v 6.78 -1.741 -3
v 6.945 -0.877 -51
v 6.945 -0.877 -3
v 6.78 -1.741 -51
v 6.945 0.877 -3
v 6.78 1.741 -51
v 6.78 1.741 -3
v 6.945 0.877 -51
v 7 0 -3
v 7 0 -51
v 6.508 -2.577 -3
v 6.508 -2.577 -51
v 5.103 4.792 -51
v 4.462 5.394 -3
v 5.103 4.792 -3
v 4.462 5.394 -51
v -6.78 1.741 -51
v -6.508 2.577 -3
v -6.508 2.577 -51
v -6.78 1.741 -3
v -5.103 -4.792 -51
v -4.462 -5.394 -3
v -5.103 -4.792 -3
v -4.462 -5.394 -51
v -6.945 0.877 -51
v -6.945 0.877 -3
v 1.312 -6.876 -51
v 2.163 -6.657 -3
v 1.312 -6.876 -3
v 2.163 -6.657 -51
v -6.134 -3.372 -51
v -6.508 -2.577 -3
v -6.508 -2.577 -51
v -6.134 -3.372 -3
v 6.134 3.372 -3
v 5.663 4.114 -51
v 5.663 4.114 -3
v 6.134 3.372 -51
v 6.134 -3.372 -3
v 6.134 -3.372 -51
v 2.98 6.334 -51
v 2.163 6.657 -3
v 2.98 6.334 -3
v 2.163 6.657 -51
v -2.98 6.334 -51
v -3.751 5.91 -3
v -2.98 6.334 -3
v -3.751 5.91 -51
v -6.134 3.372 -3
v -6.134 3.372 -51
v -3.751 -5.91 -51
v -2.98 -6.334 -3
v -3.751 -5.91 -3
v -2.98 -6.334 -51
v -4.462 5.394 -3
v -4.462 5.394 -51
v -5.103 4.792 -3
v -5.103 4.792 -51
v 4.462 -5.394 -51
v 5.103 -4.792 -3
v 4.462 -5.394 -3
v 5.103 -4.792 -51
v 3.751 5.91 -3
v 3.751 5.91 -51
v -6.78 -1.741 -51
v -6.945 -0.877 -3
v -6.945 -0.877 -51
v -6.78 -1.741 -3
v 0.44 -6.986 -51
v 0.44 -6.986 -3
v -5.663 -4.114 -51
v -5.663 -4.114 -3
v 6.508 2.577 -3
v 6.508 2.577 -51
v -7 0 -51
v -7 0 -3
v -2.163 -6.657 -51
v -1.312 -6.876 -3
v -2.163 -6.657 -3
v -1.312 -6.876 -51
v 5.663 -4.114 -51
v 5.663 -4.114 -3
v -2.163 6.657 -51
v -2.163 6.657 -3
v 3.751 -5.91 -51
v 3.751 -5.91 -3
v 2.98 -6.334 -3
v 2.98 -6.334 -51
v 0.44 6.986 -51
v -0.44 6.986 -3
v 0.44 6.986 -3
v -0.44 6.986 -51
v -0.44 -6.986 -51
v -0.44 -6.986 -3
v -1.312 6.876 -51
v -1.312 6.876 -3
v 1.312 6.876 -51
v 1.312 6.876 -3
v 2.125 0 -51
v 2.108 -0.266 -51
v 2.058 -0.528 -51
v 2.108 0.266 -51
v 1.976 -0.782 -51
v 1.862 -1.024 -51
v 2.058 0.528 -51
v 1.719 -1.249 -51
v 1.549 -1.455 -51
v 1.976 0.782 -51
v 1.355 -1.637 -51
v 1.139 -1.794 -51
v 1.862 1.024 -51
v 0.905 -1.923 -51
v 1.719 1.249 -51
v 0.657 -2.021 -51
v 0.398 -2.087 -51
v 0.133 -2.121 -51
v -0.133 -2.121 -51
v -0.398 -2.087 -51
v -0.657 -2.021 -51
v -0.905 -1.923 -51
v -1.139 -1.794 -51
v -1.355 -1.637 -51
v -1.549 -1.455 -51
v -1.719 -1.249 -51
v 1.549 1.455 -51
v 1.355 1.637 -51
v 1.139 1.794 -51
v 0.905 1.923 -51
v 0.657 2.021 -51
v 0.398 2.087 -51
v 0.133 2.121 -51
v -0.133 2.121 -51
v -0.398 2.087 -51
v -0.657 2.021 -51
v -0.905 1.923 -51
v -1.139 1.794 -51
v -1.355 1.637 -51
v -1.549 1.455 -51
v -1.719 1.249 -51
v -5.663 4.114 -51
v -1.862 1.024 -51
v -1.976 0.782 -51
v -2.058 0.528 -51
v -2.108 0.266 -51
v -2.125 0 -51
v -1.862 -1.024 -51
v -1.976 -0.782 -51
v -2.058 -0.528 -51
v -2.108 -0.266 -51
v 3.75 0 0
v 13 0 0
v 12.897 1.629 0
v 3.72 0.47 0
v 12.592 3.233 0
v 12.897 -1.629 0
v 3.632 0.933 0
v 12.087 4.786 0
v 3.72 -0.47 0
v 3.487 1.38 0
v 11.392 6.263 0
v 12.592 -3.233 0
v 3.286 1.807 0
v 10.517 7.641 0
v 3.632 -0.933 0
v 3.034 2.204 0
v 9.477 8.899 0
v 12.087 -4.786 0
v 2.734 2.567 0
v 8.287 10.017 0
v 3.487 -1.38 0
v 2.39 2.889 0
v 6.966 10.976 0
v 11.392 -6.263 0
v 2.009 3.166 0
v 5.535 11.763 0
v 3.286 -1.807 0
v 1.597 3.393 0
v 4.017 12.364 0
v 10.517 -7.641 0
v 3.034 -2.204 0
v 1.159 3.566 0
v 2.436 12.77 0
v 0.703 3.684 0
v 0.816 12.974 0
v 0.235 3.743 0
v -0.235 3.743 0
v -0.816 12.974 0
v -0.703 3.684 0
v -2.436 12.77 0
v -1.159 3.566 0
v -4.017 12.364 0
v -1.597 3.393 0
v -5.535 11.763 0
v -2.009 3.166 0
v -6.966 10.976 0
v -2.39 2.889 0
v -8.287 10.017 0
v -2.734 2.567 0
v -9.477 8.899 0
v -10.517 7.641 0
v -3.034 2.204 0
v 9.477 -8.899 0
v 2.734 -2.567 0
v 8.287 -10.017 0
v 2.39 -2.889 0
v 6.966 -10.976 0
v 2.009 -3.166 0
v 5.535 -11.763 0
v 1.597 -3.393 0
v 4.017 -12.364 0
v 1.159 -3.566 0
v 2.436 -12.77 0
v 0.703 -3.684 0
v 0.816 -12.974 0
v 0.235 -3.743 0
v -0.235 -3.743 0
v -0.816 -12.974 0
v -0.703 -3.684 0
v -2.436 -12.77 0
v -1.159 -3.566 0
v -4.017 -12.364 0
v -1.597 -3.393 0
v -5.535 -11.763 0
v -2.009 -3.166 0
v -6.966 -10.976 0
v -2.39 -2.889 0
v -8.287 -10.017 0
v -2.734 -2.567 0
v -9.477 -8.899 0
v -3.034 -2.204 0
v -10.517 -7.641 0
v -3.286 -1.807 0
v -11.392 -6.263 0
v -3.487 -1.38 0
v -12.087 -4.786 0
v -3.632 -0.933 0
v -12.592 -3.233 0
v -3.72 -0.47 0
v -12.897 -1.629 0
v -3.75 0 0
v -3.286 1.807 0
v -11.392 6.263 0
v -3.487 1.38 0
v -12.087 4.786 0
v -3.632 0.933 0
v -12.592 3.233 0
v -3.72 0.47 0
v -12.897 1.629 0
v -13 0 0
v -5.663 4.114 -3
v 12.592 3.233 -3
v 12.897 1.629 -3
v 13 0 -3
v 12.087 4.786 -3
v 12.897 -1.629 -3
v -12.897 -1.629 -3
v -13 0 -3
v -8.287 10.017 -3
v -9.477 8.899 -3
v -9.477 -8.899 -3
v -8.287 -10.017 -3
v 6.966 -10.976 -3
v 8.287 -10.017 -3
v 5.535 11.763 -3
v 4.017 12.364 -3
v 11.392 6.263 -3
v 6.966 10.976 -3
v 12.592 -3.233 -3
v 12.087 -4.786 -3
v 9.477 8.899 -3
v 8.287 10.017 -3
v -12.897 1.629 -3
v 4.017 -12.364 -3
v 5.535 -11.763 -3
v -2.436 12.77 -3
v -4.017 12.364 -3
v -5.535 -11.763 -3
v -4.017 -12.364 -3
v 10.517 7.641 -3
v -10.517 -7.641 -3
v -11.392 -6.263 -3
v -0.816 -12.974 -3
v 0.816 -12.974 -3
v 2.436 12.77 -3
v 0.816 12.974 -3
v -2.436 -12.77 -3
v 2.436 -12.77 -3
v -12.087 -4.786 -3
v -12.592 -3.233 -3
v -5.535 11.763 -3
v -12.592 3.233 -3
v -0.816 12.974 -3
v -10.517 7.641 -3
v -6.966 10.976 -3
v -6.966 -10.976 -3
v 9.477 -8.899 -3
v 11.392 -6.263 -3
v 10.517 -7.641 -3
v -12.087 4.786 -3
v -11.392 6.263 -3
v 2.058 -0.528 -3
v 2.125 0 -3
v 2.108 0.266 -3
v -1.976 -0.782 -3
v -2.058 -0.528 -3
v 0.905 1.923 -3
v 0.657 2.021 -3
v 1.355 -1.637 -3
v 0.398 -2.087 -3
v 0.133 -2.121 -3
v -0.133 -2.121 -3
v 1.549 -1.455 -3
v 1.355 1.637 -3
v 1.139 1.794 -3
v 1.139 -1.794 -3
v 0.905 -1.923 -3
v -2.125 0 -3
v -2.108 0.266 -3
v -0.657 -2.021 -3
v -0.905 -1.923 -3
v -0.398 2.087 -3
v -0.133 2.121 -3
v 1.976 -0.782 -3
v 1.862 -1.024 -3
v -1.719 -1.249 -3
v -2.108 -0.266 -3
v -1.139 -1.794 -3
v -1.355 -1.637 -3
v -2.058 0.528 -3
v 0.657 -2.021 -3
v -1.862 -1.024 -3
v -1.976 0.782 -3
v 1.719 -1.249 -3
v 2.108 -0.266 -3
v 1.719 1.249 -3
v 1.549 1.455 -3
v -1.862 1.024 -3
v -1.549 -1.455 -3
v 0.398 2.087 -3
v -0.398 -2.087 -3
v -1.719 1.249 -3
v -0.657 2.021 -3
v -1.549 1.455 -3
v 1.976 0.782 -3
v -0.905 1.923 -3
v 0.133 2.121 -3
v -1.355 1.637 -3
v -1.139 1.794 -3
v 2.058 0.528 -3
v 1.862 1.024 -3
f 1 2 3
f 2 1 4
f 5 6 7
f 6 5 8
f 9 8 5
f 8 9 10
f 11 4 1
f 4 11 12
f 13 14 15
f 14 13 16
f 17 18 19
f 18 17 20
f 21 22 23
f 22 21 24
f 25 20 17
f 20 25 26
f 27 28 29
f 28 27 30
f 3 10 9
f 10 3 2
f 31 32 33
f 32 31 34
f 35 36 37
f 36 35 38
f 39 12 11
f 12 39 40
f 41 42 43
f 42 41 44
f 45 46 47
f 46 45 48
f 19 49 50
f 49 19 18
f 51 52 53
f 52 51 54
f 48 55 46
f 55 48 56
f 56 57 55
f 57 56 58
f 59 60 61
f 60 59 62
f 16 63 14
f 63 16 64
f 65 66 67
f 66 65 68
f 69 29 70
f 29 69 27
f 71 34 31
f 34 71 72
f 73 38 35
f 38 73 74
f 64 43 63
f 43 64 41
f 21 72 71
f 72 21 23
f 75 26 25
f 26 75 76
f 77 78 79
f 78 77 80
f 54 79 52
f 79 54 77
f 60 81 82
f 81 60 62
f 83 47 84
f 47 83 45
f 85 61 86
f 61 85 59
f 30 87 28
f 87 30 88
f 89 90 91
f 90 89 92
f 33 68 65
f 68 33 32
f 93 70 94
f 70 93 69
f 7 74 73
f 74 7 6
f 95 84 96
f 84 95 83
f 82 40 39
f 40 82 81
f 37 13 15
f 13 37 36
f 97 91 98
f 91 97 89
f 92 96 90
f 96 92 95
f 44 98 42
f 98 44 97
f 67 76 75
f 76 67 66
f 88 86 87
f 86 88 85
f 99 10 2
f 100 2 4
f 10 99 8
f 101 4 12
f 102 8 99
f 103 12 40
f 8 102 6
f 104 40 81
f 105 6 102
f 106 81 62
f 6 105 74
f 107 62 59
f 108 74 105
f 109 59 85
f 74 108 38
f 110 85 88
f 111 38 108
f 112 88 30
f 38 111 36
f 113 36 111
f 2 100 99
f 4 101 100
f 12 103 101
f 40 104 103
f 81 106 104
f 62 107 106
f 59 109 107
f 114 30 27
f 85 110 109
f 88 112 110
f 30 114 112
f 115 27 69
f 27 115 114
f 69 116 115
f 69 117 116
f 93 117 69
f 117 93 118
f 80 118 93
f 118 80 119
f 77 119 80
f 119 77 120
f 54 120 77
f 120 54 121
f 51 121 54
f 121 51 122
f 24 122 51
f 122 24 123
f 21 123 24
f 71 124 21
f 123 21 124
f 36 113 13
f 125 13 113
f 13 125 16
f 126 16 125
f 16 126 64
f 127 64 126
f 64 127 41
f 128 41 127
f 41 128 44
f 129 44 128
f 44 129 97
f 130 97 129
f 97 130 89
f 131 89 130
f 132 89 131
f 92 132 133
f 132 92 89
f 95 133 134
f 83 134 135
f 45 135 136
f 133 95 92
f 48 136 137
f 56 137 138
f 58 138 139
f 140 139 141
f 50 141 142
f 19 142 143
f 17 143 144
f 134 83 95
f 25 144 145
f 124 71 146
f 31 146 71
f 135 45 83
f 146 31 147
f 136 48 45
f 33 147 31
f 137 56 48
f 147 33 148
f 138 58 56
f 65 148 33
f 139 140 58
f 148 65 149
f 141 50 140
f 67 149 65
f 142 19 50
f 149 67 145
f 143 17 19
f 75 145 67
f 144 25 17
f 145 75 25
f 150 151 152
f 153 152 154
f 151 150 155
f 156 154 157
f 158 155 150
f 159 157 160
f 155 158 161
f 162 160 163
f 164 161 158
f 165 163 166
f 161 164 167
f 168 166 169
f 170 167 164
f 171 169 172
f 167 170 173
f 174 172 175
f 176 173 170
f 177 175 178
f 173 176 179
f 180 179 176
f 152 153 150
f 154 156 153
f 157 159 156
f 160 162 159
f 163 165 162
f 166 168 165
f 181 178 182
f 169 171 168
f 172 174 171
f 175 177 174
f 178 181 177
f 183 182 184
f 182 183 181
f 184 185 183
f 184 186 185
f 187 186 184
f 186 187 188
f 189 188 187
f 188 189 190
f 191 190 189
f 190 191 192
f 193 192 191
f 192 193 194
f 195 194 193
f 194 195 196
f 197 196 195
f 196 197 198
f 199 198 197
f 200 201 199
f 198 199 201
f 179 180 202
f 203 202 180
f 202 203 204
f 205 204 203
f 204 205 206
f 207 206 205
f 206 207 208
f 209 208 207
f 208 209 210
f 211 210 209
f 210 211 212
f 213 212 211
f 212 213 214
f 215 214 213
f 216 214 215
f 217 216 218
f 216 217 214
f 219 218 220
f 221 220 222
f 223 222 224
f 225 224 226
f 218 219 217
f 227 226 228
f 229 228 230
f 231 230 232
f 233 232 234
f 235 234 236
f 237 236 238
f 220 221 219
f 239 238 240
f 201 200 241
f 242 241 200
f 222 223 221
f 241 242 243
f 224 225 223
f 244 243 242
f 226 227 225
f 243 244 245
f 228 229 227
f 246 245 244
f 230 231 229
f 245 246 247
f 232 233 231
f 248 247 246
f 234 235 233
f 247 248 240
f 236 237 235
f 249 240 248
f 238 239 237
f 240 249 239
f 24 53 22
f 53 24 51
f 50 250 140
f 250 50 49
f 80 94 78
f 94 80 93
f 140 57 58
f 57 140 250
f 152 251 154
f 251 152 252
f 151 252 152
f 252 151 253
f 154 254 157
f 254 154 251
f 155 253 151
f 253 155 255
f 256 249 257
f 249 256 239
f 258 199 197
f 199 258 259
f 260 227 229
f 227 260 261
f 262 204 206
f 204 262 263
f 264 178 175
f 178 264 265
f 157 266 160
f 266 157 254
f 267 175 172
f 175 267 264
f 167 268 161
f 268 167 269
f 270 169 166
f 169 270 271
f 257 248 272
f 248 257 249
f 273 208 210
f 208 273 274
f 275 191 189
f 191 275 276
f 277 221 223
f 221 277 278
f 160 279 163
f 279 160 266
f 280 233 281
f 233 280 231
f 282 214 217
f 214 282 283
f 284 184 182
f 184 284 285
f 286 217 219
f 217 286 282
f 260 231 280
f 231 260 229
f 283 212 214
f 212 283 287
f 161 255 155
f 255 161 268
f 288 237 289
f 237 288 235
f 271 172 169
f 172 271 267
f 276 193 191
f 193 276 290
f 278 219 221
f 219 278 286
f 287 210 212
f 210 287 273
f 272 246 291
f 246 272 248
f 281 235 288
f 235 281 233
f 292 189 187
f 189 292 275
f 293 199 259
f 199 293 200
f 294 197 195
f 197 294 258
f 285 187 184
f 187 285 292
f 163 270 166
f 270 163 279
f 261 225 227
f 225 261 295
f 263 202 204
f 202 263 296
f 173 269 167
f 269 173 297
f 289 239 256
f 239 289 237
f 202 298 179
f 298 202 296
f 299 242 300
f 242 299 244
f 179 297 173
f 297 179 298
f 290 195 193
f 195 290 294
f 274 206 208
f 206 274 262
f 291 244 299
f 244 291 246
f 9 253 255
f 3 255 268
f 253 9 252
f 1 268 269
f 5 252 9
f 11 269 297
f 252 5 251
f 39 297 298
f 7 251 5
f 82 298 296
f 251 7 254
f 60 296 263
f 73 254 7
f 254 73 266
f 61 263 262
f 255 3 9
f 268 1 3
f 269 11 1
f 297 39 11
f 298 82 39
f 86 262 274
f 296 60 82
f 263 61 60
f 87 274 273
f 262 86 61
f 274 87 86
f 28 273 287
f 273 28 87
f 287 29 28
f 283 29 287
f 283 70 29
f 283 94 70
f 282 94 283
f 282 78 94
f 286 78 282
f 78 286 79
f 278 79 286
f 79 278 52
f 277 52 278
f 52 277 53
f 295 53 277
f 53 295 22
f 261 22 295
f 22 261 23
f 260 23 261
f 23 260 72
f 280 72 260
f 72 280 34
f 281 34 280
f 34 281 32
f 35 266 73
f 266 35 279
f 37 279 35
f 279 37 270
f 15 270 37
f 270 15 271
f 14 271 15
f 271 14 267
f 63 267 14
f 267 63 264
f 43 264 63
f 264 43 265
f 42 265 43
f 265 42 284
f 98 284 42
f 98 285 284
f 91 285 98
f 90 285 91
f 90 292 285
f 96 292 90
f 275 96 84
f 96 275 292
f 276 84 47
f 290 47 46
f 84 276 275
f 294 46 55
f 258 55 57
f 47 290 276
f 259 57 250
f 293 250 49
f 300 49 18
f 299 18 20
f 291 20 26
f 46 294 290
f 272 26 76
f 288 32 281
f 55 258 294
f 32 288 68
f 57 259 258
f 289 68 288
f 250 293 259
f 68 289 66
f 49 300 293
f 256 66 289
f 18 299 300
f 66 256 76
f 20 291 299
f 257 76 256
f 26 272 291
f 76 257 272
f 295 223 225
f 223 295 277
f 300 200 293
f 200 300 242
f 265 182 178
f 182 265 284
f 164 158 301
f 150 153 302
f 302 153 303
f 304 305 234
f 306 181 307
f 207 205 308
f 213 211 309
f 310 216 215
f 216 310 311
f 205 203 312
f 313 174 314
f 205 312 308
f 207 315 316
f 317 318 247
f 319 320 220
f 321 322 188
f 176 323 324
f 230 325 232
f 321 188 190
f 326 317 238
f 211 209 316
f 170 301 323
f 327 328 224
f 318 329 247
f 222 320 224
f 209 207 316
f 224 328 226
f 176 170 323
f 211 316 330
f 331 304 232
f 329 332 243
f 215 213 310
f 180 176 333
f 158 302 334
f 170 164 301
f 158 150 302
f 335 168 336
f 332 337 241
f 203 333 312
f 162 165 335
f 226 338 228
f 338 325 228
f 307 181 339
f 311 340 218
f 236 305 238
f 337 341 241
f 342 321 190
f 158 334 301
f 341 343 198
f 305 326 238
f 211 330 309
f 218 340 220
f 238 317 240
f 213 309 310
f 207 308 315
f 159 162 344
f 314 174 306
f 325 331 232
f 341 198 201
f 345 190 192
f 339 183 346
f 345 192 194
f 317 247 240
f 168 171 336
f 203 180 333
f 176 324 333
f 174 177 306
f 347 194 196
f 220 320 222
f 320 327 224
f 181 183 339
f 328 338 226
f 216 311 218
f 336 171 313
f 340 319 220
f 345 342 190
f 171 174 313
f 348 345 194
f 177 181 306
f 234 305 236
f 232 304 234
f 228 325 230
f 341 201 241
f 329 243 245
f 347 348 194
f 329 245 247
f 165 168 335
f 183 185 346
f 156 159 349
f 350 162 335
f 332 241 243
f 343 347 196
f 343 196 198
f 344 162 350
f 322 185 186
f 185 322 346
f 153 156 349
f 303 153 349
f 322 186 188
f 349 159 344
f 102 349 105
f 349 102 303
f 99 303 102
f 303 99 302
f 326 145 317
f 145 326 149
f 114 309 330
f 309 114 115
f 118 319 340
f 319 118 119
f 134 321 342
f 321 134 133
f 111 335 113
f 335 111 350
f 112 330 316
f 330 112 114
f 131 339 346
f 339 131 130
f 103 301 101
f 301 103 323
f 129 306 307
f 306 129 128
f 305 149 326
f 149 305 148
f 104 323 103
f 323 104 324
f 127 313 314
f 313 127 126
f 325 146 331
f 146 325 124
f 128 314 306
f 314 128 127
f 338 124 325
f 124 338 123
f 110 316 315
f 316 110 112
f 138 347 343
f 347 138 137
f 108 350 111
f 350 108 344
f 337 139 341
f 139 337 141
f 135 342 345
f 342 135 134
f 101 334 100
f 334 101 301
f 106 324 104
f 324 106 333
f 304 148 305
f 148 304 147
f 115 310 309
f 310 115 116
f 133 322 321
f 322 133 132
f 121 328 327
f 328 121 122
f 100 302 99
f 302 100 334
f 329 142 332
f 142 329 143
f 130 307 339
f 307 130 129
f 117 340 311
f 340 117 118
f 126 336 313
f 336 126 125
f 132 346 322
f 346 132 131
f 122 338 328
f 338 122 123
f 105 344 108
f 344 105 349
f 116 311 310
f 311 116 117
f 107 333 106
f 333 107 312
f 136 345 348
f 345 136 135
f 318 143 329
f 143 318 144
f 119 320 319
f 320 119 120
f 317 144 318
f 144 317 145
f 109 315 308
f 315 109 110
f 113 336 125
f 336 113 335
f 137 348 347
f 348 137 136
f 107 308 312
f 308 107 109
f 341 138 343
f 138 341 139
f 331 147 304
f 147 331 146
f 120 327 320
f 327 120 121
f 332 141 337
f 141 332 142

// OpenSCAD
$fn = 50;


difference() {
	union() {
		translate(v = [0, 0, -51.0000000000]) {
			cylinder(h = 51, r = 7.0000000000);
		}
		translate(v = [0, 0, -3.0000000000]) {
			cylinder(h = 3, r = 13.0000000000);
		}
	}
	union() {
		translate(v = [0, 0, 0]) {
			rotate(a = [0, 0, 0]) {
				difference() {
					union() {
						#translate(v = [0, 0, -51.0000000000]) {
							cylinder(h = 51, r = 2.0000000000);
						}
						#translate(v = [0, 0, -3]) {
							cylinder(h = 3, r1 = 2.1250000000, r2 = 3.7500000000);
						}
						#translate(v = [0, 0, -51.0000000000]) {
							cylinder(h = 51, r = 2.1250000000);
						}
						#translate(v = [0, 0, -51.0000000000]) {
							cylinder(h = 51, r = 2.0000000000);
						}
					}
					union();
				}
			}
		}
	}
}
